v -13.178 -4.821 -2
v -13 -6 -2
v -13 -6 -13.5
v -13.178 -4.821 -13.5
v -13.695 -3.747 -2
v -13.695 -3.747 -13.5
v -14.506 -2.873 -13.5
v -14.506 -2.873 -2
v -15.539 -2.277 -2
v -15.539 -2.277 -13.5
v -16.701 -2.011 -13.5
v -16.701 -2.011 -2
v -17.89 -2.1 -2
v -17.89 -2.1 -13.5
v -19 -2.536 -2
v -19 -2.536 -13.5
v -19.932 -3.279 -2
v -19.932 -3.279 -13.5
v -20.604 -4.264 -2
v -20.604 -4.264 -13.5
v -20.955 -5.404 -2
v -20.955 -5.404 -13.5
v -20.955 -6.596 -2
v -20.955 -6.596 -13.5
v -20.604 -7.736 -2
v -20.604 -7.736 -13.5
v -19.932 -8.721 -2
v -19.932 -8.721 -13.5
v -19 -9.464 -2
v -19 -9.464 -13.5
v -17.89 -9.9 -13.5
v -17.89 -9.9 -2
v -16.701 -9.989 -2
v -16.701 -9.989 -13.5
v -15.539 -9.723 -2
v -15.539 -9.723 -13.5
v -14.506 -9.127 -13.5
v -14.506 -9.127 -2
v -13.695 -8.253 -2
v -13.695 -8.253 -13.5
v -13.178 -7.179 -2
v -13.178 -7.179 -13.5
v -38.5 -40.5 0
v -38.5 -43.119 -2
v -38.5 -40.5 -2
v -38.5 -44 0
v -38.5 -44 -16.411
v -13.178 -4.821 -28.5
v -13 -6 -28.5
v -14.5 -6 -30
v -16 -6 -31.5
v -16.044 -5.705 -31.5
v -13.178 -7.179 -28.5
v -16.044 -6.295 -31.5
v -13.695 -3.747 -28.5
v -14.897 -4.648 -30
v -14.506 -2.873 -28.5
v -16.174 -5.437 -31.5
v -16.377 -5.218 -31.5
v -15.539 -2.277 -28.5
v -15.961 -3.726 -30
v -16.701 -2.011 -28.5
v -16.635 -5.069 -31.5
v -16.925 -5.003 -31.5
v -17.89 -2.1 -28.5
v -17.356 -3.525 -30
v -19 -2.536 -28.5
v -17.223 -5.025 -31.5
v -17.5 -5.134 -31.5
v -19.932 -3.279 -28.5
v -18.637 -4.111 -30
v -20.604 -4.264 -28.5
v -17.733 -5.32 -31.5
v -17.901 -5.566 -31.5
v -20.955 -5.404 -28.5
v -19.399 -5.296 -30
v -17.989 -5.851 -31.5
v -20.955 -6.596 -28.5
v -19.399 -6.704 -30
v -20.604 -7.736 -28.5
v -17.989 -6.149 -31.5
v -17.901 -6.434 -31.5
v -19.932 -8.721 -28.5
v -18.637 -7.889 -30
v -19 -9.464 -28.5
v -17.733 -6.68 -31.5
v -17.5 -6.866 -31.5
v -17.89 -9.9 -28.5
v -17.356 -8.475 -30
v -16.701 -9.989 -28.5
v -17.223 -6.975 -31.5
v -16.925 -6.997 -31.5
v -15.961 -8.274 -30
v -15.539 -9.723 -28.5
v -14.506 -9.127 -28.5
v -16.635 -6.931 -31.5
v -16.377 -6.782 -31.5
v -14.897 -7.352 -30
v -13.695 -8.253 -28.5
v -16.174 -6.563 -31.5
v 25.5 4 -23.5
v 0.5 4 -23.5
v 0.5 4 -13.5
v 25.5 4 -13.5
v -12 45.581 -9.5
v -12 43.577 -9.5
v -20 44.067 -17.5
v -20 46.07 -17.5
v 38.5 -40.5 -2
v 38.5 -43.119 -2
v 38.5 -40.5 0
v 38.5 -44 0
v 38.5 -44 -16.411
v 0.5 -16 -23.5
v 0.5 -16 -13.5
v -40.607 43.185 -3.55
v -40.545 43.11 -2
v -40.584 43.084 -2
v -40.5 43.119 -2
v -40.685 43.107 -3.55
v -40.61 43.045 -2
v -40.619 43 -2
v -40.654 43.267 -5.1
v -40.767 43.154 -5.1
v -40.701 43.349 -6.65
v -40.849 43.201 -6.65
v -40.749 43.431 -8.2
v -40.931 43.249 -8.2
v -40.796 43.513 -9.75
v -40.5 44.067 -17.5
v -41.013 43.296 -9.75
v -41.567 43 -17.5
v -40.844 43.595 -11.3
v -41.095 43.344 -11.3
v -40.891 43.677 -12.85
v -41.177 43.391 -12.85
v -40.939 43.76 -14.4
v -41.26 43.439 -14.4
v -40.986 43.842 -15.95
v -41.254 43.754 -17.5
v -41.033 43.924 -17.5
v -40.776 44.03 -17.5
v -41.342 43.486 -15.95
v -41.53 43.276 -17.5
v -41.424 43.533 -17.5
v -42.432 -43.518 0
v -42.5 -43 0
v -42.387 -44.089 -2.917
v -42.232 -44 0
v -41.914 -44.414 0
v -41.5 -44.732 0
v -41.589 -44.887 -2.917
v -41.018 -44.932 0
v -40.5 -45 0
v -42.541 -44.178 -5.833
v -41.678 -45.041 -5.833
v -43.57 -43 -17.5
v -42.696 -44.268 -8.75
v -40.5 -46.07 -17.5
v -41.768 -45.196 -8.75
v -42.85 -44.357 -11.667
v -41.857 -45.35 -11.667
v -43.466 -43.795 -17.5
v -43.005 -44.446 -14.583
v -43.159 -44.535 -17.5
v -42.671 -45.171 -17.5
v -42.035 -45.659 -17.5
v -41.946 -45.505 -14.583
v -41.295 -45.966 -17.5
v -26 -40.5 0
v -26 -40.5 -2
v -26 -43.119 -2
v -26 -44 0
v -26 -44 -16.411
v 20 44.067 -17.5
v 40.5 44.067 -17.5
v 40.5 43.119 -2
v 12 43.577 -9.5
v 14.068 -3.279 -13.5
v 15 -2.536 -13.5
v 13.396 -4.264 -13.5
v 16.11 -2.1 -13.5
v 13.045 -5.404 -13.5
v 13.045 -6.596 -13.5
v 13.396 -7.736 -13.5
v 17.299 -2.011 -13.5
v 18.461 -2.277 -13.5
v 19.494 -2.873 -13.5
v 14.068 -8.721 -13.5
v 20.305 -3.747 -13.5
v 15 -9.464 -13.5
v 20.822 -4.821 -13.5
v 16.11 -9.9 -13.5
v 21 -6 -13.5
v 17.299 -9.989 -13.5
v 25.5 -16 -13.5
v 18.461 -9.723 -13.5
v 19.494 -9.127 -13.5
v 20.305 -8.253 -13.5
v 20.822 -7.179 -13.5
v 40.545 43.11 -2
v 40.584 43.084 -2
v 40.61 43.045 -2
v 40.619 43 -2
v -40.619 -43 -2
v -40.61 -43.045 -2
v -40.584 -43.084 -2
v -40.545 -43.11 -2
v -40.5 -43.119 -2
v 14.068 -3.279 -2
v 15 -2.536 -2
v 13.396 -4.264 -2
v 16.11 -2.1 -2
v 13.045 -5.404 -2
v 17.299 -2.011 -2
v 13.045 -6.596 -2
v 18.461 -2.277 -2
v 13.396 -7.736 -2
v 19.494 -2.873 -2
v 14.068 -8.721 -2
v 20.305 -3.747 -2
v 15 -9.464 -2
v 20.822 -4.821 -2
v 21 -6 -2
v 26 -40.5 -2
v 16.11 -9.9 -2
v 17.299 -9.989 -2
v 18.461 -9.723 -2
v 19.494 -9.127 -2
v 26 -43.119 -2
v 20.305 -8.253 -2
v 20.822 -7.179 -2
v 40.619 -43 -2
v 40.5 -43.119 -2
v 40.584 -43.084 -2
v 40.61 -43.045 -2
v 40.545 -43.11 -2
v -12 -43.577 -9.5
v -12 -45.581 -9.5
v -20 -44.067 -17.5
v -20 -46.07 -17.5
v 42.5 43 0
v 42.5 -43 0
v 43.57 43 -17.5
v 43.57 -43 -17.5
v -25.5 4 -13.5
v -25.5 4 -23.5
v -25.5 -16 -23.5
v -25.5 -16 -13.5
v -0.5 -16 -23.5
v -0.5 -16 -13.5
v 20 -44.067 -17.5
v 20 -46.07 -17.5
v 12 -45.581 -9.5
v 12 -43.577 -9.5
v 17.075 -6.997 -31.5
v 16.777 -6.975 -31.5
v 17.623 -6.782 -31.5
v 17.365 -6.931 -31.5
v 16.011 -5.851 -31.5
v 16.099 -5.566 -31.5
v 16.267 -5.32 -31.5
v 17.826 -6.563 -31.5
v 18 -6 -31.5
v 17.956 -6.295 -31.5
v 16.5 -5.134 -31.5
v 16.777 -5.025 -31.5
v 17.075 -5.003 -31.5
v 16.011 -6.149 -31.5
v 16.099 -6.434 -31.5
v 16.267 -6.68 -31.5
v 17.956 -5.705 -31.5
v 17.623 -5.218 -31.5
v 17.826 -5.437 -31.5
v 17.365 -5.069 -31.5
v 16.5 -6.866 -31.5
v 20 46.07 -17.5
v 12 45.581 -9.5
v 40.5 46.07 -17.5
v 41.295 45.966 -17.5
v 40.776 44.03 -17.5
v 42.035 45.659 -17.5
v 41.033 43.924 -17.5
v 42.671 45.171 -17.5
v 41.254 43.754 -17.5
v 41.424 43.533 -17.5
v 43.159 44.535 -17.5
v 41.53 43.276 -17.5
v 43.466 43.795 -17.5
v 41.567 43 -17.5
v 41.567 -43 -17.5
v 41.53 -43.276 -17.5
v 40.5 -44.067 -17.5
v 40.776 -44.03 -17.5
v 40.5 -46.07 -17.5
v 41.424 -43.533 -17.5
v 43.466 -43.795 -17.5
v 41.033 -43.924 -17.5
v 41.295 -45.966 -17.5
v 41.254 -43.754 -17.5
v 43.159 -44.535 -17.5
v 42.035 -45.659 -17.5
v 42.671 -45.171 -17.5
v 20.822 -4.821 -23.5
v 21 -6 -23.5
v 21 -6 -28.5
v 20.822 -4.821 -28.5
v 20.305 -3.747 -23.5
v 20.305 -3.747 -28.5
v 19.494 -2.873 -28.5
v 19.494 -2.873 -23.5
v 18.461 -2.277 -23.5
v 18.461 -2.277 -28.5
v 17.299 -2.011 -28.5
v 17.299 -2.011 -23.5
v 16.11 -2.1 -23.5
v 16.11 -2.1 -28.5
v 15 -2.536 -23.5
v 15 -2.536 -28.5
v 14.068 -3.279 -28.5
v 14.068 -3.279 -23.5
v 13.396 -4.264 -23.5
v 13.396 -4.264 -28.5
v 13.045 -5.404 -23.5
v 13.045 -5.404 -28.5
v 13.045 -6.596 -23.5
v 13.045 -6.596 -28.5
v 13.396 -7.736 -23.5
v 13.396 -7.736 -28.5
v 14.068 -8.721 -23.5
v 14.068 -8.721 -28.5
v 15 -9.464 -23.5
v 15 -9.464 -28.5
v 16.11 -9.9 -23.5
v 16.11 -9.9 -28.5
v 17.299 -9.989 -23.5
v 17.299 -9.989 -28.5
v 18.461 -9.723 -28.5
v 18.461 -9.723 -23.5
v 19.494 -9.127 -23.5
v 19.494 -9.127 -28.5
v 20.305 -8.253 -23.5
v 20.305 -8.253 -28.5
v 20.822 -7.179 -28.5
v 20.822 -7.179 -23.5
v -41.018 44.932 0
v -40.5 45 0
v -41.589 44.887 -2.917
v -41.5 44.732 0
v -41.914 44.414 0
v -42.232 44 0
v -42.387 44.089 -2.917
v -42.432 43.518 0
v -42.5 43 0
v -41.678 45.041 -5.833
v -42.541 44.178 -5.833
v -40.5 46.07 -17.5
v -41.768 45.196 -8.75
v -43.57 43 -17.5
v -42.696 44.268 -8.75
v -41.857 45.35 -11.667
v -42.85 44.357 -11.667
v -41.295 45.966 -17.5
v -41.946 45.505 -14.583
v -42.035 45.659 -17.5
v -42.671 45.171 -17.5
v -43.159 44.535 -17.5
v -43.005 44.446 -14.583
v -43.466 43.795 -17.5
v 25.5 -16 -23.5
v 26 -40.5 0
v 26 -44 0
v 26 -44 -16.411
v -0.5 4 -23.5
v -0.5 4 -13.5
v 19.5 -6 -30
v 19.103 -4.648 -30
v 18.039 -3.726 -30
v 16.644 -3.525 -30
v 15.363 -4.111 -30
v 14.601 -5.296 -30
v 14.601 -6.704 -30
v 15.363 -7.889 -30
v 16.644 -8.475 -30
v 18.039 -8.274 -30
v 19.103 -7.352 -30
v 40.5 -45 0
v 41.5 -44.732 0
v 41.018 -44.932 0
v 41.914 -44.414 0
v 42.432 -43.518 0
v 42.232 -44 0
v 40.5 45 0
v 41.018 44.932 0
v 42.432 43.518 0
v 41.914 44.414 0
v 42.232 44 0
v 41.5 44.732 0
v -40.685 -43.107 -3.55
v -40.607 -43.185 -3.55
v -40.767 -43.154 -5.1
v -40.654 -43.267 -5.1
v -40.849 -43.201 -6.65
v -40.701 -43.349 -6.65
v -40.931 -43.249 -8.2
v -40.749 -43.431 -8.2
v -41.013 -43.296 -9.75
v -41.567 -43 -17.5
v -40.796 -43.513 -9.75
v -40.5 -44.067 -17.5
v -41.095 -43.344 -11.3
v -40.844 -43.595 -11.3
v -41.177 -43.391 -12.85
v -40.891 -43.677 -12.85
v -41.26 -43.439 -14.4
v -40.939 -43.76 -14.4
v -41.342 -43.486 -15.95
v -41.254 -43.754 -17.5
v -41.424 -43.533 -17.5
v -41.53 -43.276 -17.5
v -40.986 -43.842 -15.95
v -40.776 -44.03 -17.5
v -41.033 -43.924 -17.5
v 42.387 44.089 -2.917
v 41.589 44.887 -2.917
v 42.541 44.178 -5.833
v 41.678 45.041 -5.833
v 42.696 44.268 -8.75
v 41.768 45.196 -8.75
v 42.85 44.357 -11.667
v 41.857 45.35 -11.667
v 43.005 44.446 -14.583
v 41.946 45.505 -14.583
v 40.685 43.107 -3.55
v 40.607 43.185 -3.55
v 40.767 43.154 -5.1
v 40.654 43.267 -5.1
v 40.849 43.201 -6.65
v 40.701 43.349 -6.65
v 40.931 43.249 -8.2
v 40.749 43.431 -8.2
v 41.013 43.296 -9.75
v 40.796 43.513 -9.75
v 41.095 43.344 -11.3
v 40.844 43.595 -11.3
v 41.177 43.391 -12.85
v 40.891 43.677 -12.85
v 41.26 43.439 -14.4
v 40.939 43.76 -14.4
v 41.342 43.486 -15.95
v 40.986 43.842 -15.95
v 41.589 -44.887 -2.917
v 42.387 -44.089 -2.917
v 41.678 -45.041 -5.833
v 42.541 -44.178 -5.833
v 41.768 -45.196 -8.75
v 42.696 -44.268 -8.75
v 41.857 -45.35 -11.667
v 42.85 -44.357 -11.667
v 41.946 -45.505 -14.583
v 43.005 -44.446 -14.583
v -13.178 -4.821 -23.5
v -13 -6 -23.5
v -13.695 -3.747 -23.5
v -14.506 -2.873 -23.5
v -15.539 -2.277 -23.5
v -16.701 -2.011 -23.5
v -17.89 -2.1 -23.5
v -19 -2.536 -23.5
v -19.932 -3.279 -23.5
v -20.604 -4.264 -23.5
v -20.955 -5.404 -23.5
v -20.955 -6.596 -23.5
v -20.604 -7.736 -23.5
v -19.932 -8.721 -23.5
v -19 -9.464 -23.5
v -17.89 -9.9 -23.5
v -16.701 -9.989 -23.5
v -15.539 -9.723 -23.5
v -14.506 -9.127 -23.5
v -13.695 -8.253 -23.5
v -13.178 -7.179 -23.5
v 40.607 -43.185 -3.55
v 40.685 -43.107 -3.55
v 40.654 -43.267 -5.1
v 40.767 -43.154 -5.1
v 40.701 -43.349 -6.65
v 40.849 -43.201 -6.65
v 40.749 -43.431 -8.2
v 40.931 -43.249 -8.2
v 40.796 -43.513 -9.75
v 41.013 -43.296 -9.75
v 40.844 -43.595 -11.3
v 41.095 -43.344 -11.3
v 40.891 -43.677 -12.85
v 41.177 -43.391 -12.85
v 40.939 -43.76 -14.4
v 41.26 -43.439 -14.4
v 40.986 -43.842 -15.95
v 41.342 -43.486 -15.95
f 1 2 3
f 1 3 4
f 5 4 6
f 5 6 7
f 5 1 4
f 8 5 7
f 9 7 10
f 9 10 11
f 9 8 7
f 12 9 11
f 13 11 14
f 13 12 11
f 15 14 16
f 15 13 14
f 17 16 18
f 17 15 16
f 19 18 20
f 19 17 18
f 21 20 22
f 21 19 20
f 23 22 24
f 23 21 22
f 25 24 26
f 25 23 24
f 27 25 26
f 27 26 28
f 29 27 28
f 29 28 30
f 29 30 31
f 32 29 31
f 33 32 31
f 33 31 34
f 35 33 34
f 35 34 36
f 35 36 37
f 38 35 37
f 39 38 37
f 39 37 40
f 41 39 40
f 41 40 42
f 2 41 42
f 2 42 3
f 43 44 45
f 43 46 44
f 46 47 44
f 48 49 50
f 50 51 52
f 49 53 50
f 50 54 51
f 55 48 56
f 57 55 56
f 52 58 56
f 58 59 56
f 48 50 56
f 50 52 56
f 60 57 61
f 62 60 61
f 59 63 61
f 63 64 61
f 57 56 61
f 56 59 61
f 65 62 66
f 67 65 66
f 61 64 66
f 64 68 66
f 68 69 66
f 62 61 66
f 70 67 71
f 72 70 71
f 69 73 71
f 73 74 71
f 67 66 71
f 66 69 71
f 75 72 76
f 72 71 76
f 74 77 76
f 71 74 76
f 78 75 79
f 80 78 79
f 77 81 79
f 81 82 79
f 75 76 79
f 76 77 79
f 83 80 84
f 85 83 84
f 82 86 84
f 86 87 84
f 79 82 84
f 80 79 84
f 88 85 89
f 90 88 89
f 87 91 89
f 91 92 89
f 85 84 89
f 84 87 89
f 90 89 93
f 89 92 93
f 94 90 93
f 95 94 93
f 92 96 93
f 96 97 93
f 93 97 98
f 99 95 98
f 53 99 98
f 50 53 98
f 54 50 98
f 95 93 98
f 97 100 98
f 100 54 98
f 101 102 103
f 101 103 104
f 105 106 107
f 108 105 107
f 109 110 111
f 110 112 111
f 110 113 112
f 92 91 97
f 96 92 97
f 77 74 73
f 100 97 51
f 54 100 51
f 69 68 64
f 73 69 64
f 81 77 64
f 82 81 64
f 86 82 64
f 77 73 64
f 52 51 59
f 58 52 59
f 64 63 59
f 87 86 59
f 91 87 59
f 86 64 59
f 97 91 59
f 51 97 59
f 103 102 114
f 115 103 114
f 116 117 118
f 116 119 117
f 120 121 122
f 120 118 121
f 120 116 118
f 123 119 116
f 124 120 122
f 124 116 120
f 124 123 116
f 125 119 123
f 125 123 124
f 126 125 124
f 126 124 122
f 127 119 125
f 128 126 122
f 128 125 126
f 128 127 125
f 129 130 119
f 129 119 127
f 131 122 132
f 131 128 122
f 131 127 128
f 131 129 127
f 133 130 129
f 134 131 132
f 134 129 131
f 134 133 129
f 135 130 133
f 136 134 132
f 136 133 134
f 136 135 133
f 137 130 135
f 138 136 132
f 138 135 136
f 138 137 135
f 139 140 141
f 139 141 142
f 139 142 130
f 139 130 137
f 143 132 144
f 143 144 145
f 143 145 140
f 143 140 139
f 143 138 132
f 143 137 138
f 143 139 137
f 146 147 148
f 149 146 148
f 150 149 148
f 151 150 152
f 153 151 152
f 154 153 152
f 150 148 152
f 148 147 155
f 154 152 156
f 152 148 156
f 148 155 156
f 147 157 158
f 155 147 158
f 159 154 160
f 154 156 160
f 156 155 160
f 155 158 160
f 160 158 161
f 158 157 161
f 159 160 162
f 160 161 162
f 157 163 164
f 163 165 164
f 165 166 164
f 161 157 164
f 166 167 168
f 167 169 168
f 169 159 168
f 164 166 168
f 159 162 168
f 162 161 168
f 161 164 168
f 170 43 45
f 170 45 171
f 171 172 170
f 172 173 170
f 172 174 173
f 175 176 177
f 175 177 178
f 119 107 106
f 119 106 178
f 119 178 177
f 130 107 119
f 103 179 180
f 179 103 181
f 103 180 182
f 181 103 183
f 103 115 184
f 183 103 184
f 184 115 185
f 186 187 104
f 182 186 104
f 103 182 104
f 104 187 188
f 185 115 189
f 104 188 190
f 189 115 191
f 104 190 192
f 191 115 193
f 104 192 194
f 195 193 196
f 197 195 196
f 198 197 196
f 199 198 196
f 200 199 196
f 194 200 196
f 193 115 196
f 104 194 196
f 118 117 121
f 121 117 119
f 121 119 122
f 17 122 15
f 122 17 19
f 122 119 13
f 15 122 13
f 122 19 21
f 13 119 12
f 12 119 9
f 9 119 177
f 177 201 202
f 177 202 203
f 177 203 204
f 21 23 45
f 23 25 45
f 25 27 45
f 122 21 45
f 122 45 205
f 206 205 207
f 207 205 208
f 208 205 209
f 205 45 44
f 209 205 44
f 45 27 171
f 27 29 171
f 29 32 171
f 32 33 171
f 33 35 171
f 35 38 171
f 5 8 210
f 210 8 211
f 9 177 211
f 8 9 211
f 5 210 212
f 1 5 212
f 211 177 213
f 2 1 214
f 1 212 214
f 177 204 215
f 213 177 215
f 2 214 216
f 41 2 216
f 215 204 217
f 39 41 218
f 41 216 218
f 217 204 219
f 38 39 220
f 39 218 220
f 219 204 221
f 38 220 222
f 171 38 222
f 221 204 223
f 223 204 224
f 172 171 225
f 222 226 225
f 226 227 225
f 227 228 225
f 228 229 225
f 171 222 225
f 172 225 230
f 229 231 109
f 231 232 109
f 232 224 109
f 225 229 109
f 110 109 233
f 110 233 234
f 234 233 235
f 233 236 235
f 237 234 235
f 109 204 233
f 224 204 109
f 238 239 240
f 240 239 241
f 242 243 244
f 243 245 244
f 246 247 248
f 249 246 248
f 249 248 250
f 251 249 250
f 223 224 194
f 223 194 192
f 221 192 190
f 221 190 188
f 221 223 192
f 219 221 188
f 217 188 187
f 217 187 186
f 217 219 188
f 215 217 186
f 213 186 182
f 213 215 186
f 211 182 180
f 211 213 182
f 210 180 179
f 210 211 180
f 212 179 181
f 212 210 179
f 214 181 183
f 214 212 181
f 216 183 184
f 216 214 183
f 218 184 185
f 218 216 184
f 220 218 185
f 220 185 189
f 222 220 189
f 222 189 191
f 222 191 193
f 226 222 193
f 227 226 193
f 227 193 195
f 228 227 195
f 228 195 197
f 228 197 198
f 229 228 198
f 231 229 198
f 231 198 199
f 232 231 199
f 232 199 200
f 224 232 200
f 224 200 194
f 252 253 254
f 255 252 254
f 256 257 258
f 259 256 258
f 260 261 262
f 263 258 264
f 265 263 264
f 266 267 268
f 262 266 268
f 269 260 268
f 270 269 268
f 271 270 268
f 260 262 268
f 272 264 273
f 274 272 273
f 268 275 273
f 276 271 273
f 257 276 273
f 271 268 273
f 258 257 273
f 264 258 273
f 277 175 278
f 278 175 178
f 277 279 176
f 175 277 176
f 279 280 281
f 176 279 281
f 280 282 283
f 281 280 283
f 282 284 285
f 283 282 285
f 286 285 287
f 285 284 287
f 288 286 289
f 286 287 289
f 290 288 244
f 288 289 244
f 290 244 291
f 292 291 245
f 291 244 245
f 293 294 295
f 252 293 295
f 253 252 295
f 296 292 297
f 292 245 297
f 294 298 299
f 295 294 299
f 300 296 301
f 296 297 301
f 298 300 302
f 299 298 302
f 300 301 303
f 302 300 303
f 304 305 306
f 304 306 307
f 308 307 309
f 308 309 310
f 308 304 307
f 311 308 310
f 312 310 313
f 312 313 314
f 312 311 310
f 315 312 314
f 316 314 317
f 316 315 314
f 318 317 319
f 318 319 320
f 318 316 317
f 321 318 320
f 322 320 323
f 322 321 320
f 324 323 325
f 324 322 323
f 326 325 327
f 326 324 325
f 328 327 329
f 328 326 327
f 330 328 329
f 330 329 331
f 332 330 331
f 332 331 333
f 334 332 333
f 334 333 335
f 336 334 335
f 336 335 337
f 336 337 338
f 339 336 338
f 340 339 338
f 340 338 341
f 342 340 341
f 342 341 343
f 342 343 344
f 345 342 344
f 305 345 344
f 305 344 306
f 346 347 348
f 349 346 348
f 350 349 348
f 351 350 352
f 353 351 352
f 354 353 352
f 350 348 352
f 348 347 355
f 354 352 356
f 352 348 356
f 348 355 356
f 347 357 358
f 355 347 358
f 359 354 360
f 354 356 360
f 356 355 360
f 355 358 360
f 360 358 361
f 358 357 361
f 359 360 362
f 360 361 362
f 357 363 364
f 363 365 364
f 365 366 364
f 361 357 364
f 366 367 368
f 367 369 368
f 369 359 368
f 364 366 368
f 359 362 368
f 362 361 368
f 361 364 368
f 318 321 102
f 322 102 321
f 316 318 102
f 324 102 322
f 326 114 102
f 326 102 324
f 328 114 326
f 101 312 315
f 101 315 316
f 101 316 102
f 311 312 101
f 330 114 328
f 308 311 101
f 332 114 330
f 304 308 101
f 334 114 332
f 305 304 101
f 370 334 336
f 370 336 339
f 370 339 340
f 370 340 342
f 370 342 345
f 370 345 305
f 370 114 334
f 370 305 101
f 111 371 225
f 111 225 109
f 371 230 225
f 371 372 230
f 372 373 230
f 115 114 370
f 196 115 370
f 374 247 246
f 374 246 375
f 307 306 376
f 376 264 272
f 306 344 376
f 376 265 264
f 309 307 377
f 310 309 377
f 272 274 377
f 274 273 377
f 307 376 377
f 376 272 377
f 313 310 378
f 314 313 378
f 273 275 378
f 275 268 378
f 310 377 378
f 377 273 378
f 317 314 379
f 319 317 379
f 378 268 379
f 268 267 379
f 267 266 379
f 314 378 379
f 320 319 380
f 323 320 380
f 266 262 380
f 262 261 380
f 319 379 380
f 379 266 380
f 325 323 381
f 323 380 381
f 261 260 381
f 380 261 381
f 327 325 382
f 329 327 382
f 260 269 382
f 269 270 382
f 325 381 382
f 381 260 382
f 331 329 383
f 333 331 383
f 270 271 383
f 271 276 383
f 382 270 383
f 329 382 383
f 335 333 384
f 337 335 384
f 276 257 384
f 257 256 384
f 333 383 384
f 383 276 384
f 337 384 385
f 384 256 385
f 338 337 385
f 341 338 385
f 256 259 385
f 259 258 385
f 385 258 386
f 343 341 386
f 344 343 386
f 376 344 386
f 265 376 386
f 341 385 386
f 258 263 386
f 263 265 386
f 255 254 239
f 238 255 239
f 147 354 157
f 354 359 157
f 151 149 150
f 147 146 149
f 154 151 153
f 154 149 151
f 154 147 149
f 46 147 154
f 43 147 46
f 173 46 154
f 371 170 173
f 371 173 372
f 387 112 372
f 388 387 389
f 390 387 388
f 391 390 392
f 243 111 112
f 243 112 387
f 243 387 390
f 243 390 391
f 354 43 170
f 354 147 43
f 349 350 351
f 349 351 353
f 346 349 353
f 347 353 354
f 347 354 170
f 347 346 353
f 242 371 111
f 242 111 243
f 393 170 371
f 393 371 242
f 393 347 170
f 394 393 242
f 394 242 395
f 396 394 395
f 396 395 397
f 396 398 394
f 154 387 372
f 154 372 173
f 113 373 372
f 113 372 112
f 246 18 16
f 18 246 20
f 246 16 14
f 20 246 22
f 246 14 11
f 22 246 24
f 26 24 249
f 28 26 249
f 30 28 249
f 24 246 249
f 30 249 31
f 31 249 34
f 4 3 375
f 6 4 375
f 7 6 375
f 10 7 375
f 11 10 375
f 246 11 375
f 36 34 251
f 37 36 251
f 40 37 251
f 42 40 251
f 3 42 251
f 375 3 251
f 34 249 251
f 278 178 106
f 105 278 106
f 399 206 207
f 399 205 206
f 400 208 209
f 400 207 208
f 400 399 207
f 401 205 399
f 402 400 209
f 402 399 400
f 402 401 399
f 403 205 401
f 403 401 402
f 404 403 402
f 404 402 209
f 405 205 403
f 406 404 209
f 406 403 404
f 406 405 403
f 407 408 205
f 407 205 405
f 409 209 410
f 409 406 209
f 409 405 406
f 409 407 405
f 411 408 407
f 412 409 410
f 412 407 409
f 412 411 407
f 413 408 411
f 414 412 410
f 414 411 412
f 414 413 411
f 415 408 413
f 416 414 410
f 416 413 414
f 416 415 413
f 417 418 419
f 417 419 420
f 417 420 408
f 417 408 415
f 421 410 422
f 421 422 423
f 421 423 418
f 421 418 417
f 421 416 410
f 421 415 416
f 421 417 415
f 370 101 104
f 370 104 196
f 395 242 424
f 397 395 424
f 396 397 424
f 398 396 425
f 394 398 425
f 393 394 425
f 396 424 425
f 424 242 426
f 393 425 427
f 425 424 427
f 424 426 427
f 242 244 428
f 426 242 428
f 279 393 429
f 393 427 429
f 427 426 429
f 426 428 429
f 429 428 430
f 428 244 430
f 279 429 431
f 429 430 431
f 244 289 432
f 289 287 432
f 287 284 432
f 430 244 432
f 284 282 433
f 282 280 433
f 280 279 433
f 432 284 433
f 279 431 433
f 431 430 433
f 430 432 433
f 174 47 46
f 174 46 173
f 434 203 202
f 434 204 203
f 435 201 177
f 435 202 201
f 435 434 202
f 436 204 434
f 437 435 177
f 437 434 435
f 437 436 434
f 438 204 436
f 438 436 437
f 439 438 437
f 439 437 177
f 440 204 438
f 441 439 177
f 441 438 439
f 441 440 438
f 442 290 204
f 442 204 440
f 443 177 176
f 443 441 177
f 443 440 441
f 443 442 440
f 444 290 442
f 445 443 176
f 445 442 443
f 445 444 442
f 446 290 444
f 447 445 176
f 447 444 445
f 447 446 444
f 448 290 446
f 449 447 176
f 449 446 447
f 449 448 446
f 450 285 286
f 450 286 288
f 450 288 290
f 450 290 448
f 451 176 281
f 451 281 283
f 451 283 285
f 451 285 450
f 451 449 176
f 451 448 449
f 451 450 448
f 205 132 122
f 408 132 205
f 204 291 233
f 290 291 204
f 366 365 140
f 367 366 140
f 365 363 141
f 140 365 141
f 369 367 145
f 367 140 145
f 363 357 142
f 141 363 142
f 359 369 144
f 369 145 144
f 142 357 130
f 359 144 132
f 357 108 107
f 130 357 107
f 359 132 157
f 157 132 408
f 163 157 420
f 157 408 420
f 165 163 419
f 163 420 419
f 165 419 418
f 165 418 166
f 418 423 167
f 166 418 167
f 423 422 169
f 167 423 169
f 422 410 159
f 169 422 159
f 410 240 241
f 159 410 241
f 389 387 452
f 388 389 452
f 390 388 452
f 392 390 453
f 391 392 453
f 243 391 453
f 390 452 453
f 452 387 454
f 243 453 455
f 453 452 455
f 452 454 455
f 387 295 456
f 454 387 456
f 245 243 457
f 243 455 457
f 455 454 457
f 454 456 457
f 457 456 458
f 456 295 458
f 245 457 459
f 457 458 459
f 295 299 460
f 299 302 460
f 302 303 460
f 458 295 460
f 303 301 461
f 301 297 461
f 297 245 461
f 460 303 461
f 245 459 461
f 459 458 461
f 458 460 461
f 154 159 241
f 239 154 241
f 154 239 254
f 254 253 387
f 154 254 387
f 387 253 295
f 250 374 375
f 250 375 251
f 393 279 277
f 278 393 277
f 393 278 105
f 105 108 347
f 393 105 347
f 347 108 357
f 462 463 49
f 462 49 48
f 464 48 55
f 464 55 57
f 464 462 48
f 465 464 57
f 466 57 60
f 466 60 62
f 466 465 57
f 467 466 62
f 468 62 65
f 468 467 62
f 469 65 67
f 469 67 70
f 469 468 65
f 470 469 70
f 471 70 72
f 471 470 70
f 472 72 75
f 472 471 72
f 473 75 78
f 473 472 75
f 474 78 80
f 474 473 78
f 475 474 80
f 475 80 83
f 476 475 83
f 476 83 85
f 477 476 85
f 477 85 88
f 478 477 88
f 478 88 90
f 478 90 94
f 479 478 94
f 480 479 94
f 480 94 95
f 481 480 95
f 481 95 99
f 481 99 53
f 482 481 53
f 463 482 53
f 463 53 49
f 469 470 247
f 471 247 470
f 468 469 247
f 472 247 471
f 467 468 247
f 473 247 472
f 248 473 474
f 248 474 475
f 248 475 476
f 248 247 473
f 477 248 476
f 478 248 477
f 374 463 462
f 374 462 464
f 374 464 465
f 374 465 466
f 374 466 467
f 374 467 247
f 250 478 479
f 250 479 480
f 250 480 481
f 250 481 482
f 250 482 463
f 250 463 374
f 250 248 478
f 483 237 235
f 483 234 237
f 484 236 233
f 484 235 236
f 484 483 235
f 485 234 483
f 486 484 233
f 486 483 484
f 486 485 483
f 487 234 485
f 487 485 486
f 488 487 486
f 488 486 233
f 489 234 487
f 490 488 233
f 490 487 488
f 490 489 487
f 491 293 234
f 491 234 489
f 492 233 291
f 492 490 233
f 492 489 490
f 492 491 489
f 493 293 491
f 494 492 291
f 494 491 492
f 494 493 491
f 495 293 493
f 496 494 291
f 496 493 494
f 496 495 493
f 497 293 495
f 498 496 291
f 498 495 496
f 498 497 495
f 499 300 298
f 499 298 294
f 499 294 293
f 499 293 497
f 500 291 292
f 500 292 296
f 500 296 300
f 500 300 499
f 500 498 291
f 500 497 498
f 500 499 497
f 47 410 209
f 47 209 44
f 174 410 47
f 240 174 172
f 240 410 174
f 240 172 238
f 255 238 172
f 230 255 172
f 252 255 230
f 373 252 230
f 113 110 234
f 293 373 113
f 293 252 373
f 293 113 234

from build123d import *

# Parameters (mm, degrees)
F1_DEPTH  = 17.5
F1_TAPER  = -3.5
F3_DEPTH  = 75
F4_T      = 2
F5_W      = 12.5
F5_H      = 3.5
F6_DEPTH  = 17.5010001
F7_R      = 4
F8_DEPTH  = 31.5
F9_SIZE   = 3
F11_W     = 25
F11_H     = 20
F12_DEPTH = 10


# Not quite as in the source:
# - a shell that OpenCascade refuses in one call is made with other operations: the cavity is built on its own and cut out


with BuildPart() as f1:
    # F0 (on Top) → F1 (new body)
    with BuildSketch(Plane.XY):
        with BuildLine():
            Line((-40.5, -45), (40.5, -45))
            ThreePointArc((40.5, -45), (41.9142135624, -44.4142135624), (42.5, -43))
            Line((42.5, -43), (42.5, 43))
            ThreePointArc((42.5, 43), (41.9142135624, 44.4142135624), (40.5, 45))
            Line((40.5, 45), (-40.5, 45))
            ThreePointArc((-40.5, 45), (-41.9142135624, 44.4142135624), (-42.5, 43))
            Line((-42.5, 43), (-42.5, -43))
            ThreePointArc((-42.5, -43), (-41.9142135624, -44.4142135624), (-40.5, -45))
        make_face()
    extrude(amount=-F1_DEPTH, taper=F1_TAPER)

    # F2 (on Front) → F3 (cut, symmetric)
    with BuildSketch(Plane.XZ):
        Polygon((-20, -17.5), (0, -17.5), (20, -17.5), (12, -9.5), (0, -9.5), (-12, -9.5), align=None)
    extrude(amount=F3_DEPTH, both=True, mode=Mode.SUBTRACT)

    # F4: shell of thickness 2, made by hand


with BuildPart() as f4_core1:
    # F4_t2: copy of F1
    add(f1.part)

    # the walls: a layer under each face that stays
    f4_faces = [f4_core1.faces().sort_by_distance(p)[0] for p in [
        (0, -45.5351729263, -8.75),
        (-42.2926379677, -44.7926379677, -8.75),
        (42.2926379677, -44.7926379677, -8.75),
        (0, 0, 0),
        (-43.0351729263, 0, -8.75),
        (-42.2926379677, 44.7926379677, -8.75),
        (0, 45.5351729263, -8.75),
        (42.2926379677, 44.7926379677, -8.75),
        (43.0351729263, 0, -8.75),
    ]]
    thicken(f4_faces, amount=-F4_T, mode=Mode.SUBTRACT)


with BuildPart() as f1_1:
    add(f1.part)

    # what is left inside the walls is the cavity
    f4_cavity = [f4_core1.part.solids().sort_by_distance(p)[0] for p in [
        (-13.539529, 0, -2.02),
    ]]
    add(f4_cavity, mode=Mode.SUBTRACT)

    # F5 (on Top) → F6 (cut, through all)
    with BuildSketch(Plane.XY):
        with Locations((-32.25, -42.25)):
            Rectangle(F5_W, F5_H)
        with Locations((32.25, -42.25)):
            Rectangle(F5_W, F5_H)
    extrude(amount=-F6_DEPTH, mode=Mode.SUBTRACT)

    # F7 (on Top) → F8 (join)
    with BuildSketch(Plane.XY):
        with Locations((-17, -6)):
            Circle(F7_R)
        with Locations((17, -6)):
            Circle(F7_R)
    extrude(amount=-F8_DEPTH)

    # F9
    f9_edges = [f1_1.edges().sort_by_distance(p)[0] for p in [
        (-21, -6, -31.5),
        (13, -6, -31.5),
    ]]
    chamfer(f9_edges, length=F9_SIZE)

    # F11 (on offset) → F12 (join)
    with BuildSketch(Plane(origin=(0, 0, -23.5), x_dir=(1, 0, 0), z_dir=(0, 0, -1))):
        with Locations((-13, 6)):
            Rectangle(F11_W, F11_H)
        with Locations((13, 6)):
            Rectangle(F11_W, F11_H)
    extrude(amount=-F12_DEPTH)


solid = f1_1.part
